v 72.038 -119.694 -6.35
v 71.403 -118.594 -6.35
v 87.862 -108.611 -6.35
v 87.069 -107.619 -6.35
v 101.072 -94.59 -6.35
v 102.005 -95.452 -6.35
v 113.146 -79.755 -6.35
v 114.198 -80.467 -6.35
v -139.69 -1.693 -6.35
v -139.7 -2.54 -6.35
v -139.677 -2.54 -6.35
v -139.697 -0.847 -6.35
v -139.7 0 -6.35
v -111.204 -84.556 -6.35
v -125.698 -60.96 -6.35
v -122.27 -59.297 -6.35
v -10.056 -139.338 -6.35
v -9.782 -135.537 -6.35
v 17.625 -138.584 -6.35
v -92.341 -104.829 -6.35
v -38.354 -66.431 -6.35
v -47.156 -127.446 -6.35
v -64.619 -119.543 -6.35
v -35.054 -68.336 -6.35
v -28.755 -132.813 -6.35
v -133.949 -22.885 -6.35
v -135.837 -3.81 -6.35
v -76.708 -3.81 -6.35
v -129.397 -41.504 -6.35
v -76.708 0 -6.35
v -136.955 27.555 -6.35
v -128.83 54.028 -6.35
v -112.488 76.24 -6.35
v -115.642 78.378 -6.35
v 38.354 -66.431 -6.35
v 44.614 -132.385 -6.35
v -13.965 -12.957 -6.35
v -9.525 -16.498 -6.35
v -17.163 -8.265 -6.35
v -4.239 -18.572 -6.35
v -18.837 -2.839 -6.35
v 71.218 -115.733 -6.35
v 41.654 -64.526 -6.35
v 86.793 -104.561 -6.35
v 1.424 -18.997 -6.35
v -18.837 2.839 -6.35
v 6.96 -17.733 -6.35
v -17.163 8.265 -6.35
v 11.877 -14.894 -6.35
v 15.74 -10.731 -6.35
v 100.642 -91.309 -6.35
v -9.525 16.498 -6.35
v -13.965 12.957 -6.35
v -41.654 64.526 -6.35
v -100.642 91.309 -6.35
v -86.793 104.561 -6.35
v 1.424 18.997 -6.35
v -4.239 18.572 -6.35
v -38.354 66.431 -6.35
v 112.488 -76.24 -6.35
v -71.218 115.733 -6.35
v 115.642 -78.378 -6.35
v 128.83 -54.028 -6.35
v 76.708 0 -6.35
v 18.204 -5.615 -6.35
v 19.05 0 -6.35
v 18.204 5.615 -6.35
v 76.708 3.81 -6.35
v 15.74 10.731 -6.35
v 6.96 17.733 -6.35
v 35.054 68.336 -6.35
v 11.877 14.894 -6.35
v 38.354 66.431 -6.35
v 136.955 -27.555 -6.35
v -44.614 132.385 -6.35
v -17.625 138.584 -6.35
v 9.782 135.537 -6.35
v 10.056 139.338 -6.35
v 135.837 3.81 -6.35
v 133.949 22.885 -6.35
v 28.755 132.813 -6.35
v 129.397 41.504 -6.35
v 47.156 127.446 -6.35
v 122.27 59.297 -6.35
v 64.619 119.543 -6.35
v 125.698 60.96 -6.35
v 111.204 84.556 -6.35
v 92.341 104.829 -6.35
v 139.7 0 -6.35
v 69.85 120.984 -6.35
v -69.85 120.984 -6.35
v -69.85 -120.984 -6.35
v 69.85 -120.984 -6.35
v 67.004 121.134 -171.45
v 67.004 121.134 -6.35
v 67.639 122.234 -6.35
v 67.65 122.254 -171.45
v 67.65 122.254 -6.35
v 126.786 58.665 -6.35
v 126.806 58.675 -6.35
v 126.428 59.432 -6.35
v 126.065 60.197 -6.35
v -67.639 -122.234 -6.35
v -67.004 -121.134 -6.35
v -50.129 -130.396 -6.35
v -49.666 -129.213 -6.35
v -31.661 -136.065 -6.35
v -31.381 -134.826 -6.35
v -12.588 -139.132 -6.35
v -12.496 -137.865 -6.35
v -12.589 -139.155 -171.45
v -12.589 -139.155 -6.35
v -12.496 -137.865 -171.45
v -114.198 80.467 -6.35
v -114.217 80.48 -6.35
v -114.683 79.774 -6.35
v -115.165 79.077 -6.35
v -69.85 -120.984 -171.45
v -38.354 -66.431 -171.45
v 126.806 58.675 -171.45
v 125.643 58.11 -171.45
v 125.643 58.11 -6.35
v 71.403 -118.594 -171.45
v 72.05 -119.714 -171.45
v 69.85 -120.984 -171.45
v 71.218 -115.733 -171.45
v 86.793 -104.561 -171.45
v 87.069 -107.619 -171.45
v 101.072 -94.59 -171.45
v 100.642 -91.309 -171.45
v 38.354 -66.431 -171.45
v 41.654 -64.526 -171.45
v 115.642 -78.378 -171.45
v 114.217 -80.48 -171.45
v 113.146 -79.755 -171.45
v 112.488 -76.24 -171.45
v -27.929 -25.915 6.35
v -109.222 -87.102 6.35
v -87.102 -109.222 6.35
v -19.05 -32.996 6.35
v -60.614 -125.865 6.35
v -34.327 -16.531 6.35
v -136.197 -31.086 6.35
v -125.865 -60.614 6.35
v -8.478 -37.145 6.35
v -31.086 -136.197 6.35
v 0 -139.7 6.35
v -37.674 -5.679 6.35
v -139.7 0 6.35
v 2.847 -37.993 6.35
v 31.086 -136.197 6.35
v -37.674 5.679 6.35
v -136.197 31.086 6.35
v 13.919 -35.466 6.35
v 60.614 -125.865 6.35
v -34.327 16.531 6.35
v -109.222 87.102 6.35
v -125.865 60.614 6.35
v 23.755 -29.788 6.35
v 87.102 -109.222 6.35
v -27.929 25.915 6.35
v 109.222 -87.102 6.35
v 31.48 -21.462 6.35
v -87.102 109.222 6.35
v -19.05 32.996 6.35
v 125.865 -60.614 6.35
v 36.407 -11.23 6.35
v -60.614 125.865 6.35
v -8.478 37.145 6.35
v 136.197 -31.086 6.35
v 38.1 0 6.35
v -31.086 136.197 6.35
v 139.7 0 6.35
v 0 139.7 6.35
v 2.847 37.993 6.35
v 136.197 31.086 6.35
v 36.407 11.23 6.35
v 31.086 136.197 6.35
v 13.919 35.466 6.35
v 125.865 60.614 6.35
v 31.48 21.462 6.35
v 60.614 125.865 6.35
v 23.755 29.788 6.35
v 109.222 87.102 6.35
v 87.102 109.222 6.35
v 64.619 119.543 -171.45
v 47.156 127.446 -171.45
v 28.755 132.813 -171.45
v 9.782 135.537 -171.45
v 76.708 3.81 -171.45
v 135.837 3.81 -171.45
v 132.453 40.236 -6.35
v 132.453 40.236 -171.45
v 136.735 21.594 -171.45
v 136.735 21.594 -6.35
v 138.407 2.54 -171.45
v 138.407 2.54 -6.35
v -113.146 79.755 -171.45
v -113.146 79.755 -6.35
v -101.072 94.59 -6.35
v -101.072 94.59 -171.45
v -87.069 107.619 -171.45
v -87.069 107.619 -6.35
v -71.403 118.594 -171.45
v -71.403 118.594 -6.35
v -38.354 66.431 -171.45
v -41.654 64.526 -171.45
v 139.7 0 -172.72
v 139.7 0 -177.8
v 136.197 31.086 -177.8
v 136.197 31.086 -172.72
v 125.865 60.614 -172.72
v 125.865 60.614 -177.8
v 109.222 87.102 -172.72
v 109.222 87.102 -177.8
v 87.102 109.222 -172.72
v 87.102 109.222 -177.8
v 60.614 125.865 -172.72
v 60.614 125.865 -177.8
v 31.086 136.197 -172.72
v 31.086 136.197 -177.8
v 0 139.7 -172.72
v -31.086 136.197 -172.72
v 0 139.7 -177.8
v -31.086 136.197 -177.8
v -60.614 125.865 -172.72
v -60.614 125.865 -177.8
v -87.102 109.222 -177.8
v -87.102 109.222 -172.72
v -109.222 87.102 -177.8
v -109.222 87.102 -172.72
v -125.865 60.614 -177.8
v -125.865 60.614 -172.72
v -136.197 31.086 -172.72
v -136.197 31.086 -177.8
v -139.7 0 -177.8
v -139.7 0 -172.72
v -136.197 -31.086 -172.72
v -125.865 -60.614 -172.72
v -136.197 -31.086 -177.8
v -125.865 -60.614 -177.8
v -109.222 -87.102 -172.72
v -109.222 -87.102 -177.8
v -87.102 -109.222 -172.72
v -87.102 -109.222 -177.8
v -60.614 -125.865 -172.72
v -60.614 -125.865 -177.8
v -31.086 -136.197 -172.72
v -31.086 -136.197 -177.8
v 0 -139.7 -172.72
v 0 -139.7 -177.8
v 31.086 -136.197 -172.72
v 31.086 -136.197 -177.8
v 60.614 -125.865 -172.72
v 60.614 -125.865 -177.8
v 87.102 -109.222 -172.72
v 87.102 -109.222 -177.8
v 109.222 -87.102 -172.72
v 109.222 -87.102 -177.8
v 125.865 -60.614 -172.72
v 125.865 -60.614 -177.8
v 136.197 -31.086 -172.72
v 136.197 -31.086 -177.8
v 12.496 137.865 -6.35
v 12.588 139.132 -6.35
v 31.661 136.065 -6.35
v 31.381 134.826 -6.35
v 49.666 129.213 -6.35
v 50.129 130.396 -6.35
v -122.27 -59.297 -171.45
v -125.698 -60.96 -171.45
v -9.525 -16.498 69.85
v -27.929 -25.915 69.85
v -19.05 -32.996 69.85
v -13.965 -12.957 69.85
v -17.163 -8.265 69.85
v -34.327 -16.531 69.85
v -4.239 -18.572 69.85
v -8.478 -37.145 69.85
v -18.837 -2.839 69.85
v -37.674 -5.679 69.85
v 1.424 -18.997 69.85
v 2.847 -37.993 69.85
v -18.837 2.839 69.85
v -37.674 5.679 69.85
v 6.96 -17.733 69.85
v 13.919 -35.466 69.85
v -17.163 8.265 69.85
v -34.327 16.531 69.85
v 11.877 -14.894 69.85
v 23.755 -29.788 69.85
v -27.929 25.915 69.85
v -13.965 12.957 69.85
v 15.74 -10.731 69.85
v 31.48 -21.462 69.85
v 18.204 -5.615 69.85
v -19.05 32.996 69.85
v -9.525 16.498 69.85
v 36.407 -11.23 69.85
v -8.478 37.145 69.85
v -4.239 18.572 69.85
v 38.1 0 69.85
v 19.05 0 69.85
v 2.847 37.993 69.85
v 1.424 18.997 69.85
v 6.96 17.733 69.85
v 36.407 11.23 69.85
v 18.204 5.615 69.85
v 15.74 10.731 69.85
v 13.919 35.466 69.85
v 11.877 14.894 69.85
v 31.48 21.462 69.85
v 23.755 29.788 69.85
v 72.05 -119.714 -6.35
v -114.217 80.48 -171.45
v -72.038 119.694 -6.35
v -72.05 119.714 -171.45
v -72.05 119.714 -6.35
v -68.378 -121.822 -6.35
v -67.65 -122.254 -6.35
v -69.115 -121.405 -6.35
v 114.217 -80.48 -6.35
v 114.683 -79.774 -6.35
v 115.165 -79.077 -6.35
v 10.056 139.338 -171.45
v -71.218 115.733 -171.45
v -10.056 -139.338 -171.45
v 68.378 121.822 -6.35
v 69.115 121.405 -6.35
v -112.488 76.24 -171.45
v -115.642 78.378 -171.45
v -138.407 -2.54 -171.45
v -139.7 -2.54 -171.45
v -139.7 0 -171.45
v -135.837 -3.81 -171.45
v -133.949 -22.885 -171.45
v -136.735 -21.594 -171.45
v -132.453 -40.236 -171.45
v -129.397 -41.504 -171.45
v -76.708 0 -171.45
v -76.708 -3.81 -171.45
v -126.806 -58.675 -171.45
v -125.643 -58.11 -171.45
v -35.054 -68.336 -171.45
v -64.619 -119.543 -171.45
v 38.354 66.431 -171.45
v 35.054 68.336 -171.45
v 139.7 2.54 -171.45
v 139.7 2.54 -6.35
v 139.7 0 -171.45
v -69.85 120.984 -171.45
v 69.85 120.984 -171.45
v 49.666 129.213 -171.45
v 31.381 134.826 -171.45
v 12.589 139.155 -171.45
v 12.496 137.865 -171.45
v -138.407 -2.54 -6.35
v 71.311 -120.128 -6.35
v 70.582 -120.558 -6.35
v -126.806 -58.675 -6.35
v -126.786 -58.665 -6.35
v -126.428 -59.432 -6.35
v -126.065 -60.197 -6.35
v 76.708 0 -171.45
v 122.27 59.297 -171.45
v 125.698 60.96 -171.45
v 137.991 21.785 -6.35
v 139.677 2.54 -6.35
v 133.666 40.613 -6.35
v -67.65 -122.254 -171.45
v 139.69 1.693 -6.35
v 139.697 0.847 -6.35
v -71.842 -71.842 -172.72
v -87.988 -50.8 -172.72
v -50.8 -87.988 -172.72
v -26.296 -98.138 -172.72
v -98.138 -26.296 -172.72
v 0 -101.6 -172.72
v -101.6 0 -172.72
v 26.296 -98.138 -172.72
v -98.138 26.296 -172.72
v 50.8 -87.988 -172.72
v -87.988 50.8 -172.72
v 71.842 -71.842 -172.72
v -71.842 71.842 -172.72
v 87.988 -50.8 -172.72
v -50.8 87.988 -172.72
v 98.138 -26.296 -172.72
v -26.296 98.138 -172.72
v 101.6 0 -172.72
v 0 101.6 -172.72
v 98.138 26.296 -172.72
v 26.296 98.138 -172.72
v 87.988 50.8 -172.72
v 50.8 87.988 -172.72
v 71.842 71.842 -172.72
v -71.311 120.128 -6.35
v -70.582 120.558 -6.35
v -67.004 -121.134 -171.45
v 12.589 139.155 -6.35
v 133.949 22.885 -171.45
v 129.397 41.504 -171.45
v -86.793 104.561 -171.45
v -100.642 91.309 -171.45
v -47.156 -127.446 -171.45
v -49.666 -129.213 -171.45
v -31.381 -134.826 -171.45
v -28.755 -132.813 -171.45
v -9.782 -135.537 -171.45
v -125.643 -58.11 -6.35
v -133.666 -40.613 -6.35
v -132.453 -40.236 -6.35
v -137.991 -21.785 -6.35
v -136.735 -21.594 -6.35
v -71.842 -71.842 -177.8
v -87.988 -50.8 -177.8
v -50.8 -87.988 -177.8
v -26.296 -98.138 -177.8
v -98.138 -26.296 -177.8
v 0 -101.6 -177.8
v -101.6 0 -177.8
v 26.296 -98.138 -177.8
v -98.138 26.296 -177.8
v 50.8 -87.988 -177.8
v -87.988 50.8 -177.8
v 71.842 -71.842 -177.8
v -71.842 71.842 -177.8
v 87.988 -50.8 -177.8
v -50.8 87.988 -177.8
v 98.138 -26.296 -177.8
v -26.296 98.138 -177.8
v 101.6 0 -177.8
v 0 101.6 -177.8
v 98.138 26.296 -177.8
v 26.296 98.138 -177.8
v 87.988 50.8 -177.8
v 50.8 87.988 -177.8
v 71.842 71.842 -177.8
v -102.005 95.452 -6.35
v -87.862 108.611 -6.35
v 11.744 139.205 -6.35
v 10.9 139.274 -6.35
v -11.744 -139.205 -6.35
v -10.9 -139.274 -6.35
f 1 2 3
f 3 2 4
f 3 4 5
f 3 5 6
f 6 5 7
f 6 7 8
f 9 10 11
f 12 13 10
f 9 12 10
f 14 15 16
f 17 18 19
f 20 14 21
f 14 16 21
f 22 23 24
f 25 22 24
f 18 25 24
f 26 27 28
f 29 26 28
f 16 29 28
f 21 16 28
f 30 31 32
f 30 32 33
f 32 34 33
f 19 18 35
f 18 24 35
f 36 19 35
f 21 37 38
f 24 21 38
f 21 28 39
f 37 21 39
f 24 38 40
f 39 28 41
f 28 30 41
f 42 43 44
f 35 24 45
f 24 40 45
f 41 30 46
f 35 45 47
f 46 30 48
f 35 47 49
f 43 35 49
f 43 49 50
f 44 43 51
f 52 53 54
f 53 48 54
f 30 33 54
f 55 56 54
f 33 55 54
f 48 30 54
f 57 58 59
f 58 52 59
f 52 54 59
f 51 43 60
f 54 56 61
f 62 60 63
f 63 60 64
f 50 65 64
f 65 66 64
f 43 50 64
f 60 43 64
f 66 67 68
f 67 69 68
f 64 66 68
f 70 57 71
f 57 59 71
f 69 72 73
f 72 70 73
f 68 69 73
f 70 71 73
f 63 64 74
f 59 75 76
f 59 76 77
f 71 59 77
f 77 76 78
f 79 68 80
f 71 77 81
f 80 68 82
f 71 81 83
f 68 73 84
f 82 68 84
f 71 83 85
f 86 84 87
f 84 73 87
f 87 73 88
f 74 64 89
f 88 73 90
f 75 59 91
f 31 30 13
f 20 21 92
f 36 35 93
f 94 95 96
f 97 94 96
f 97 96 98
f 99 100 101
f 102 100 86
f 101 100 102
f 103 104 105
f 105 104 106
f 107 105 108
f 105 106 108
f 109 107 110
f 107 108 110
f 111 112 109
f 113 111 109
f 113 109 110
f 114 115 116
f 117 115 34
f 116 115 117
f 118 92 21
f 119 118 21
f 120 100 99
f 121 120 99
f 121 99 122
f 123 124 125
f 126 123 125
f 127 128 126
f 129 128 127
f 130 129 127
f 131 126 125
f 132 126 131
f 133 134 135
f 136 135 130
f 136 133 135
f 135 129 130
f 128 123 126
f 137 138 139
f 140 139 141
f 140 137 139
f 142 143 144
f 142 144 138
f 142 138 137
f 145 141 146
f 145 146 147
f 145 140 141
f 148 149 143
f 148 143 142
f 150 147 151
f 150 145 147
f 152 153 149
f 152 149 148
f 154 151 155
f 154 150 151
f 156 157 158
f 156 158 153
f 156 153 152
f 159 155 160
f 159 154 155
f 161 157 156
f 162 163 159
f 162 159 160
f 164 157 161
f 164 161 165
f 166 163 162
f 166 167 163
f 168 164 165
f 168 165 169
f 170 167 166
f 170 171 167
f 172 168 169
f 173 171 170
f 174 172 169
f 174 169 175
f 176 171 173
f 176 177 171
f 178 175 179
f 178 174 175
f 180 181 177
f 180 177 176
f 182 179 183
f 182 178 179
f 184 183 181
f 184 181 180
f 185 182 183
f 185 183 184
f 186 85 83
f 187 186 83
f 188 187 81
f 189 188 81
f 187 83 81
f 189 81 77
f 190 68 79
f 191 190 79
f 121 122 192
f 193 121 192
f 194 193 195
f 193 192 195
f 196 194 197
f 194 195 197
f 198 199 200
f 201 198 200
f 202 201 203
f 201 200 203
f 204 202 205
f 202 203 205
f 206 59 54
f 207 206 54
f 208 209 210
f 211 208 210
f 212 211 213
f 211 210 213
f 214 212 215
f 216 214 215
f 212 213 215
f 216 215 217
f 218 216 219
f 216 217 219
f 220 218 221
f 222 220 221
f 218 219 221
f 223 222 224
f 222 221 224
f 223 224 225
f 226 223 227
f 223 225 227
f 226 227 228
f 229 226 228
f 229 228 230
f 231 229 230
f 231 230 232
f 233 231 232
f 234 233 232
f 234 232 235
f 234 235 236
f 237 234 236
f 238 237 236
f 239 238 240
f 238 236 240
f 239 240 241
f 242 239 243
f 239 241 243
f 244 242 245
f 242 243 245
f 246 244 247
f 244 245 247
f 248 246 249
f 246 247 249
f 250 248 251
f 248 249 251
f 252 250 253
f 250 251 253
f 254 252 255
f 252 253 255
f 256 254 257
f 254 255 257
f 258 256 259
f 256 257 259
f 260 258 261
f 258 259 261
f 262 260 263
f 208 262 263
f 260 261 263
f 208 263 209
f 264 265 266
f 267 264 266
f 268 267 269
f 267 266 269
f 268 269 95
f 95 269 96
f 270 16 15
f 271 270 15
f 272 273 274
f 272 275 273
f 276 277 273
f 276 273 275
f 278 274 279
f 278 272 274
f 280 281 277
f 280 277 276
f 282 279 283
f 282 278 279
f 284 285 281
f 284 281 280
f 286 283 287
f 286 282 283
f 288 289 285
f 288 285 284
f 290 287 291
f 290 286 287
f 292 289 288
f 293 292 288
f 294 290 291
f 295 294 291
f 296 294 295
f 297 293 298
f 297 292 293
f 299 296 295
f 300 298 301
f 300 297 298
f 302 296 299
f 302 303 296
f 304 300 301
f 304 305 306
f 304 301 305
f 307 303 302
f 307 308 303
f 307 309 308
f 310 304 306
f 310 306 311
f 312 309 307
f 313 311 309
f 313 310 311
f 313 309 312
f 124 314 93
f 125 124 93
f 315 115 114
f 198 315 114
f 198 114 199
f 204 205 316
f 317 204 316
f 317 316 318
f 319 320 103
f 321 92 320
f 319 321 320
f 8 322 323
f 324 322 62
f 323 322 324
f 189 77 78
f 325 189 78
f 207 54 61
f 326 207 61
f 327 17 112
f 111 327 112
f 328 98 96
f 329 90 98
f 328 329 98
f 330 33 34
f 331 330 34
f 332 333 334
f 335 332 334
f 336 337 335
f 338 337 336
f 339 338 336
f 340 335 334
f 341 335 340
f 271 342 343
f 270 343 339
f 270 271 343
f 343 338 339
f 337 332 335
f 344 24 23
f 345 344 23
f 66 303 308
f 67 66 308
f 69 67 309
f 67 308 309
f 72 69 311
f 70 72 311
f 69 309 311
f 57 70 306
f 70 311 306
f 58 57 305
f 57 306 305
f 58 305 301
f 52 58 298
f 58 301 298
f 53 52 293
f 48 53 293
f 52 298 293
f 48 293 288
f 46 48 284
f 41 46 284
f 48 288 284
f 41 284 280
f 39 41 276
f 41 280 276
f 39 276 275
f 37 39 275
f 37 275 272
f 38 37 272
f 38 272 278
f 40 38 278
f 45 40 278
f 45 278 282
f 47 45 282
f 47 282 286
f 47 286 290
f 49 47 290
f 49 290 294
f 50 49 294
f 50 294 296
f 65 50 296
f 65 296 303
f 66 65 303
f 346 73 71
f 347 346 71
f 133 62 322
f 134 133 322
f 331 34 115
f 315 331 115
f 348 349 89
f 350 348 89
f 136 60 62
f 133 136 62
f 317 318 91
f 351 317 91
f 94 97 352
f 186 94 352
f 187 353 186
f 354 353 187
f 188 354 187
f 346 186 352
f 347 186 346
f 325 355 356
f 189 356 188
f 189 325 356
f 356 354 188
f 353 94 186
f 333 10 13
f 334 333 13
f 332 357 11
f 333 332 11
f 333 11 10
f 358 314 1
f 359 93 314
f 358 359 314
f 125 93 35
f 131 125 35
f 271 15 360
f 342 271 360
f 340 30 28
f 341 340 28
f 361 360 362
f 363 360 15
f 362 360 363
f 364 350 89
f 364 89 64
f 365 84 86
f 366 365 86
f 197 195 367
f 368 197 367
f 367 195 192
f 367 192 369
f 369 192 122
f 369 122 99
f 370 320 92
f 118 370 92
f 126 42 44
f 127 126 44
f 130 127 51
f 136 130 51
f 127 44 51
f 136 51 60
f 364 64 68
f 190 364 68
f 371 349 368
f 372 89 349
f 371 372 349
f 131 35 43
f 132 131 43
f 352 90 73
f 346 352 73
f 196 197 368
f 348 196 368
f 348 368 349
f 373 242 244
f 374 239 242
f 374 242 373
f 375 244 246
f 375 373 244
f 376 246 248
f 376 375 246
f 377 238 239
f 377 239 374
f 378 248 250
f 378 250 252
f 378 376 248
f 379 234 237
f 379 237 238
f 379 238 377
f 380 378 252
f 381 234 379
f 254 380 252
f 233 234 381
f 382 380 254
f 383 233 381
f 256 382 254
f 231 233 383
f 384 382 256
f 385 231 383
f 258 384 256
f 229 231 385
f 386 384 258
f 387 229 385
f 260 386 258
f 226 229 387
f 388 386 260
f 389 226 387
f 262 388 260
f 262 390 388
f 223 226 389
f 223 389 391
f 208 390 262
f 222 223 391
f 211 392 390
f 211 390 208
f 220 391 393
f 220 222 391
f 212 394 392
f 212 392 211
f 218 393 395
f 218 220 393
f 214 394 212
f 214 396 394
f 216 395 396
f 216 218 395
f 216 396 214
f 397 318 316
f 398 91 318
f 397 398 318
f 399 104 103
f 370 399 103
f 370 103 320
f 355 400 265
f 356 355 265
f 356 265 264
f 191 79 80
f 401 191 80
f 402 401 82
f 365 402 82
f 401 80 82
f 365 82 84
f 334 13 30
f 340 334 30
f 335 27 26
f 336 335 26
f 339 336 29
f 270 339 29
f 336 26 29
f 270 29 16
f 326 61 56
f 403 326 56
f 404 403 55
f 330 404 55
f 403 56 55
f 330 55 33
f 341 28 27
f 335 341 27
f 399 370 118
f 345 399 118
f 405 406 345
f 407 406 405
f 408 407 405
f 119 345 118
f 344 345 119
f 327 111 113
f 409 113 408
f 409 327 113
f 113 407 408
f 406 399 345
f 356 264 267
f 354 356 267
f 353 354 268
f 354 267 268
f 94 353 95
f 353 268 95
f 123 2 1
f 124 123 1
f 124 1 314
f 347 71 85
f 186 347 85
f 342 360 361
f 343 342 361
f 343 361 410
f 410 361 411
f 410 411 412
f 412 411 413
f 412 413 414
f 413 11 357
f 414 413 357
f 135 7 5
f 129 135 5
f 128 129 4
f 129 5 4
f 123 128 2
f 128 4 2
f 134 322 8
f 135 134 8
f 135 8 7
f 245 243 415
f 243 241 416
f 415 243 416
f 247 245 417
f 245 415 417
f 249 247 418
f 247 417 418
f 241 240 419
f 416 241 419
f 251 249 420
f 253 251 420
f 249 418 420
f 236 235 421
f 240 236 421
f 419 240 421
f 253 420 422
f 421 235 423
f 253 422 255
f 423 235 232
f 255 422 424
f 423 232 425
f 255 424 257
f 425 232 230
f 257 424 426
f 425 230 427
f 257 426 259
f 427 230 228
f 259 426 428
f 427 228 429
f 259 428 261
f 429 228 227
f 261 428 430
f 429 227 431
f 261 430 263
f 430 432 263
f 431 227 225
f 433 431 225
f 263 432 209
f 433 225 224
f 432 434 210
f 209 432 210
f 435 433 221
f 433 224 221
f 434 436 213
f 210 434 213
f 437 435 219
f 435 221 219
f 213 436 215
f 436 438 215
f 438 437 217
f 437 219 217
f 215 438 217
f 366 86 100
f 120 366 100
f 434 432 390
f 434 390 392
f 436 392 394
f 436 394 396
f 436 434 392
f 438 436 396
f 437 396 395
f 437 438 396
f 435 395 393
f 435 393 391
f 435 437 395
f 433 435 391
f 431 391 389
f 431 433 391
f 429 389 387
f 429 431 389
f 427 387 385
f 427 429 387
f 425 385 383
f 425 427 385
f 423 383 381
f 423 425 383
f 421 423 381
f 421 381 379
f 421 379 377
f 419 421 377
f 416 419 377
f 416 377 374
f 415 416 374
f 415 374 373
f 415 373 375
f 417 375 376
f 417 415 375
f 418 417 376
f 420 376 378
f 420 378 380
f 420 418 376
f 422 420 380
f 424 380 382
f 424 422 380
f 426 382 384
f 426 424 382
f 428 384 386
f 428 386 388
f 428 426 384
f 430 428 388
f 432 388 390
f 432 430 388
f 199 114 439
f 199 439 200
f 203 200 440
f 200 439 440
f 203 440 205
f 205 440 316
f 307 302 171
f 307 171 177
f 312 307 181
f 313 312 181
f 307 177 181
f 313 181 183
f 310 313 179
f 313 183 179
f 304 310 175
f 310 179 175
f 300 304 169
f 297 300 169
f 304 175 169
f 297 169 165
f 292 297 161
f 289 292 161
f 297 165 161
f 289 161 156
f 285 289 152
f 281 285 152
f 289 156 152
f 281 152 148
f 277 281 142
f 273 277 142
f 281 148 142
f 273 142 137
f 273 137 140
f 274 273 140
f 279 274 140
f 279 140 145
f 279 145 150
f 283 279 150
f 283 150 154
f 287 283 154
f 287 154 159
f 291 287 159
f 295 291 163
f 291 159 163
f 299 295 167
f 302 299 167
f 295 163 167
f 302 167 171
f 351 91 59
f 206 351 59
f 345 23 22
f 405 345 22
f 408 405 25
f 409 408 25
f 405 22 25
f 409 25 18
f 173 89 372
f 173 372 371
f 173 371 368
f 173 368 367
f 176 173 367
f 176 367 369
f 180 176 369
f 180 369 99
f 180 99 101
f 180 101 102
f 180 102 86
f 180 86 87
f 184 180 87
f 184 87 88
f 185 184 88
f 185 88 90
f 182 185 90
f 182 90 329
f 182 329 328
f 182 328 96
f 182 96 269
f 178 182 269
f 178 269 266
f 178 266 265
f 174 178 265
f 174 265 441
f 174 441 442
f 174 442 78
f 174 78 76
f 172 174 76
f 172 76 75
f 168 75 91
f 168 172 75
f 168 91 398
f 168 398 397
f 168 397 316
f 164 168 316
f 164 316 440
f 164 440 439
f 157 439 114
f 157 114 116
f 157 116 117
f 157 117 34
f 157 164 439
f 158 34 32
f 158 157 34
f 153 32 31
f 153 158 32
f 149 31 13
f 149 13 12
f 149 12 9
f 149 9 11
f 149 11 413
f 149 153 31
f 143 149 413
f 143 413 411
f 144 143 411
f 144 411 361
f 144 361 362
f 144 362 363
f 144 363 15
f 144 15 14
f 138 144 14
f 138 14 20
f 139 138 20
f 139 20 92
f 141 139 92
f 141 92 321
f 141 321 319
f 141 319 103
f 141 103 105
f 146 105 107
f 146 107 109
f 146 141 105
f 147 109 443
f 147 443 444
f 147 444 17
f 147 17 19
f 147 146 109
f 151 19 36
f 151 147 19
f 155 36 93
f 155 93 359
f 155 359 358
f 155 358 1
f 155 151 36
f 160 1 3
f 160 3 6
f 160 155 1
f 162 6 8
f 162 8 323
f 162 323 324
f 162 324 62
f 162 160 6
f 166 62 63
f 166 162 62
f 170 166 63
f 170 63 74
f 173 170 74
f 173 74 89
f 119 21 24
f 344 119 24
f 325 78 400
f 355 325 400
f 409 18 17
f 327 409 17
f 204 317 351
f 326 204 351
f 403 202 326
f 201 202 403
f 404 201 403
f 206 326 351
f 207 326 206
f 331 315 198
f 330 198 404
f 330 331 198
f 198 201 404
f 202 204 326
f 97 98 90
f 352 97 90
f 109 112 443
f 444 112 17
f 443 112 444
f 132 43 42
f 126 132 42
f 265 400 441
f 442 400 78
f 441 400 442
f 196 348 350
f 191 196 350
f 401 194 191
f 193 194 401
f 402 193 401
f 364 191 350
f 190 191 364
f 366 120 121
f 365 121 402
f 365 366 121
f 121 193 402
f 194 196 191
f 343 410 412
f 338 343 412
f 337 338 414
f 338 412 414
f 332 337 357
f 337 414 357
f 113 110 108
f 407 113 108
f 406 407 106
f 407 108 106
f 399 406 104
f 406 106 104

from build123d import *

# Parameters (mm, degrees)
SKETCH1_R           = 139.7
BOSS_EXTRUDE1_DEPTH = 6.35
SKETCH2_R           = 38.1
BOSS_EXTRUDE2_DEPTH = 63.5
SKETCH3_R           = 19.05
CUT_EXTRUDE1_DEPTH  = 212.751316407
EXTRUDE_THIN1_DEPTH = 165.1
CIRPATTERN1_COUNT   = 6
SKETCH6_R           = 139.7
SKETCH6_R_2         = 101.6
BOSS_EXTRUDE3_DEPTH = 5.08


# Read off the part's stored shape, not the designer's step: Extrude-Thin1
with BuildPart() as part:
    # Sketch1 → Boss-Extrude1 (new, symmetric)
    with BuildSketch(Plane.XY):
        Circle(SKETCH1_R)
    extrude(amount=BOSS_EXTRUDE1_DEPTH, both=True)

    # Sketch2 → Boss-Extrude2 (add)
    with BuildSketch(Plane.XY.offset(6.35)):
        Circle(SKETCH2_R)
    extrude(amount=BOSS_EXTRUDE2_DEPTH)

    # Sketch3 → Cut-Extrude1 (cut, through all)
    with BuildSketch(Plane.XY.offset(69.85)):
        Circle(SKETCH3_R)
    extrude(amount=-CUT_EXTRUDE1_DEPTH, mode=Mode.SUBTRACT)

    # Extrude-Thin1 outline → Extrude-Thin1 (add)
    with BuildSketch(Plane(origin=(0, 0, -6.35), x_dir=(-1, 0, 0), z_dir=(0, 0, -1))):
        with BuildLine():
            Line((-138.406695286, 2.54), (-139.7, 2.54))
            Line((-139.7, 2.54), (-139.7, 0))
            Line((-139.7, 0), (-76.708, 0))
            Line((-76.708, 0), (-76.708, 3.81))
            Line((-76.708, 3.81), (-135.836578284, 3.81))
            ThreePointArc((-135.836578284, 3.81), (-132.001666757, 32.274635137), (-122.269799969, 59.297454545))
            Line((-122.269799969, 59.297454545), (-125.697925202, 60.96))
            Line((-125.697925202, 60.96), (-126.806288838, 58.674583178))
            Line((-126.806288838, 58.674583178), (-125.642611535, 58.11023203))
            ThreePointArc((-125.642611535, 58.11023203), (-134.916721648, 30.989403347), (-138.406695286, 2.54))
        make_face()
    extrude_thin1 = extrude(amount=EXTRUDE_THIN1_DEPTH)

    # CirPattern1: Extrude-Thin1 ×6 about axis
    cirpattern1_axis = Axis((0, 0, 0), (0, 0, 1))
    for i in range(1, CIRPATTERN1_COUNT):
        add(extrude_thin1.rotate(cirpattern1_axis, i * 360 / CIRPATTERN1_COUNT))


with BuildPart() as body_2:
    # Sketch6 → Boss-Extrude3 (new body)
    with BuildSketch(Plane.XY.offset(-177.8)):
        Circle(SKETCH6_R)
        Circle(SKETCH6_R_2, mode=Mode.SUBTRACT)
    extrude(amount=BOSS_EXTRUDE3_DEPTH)


solid = Compound([part.part, body_2.part])
